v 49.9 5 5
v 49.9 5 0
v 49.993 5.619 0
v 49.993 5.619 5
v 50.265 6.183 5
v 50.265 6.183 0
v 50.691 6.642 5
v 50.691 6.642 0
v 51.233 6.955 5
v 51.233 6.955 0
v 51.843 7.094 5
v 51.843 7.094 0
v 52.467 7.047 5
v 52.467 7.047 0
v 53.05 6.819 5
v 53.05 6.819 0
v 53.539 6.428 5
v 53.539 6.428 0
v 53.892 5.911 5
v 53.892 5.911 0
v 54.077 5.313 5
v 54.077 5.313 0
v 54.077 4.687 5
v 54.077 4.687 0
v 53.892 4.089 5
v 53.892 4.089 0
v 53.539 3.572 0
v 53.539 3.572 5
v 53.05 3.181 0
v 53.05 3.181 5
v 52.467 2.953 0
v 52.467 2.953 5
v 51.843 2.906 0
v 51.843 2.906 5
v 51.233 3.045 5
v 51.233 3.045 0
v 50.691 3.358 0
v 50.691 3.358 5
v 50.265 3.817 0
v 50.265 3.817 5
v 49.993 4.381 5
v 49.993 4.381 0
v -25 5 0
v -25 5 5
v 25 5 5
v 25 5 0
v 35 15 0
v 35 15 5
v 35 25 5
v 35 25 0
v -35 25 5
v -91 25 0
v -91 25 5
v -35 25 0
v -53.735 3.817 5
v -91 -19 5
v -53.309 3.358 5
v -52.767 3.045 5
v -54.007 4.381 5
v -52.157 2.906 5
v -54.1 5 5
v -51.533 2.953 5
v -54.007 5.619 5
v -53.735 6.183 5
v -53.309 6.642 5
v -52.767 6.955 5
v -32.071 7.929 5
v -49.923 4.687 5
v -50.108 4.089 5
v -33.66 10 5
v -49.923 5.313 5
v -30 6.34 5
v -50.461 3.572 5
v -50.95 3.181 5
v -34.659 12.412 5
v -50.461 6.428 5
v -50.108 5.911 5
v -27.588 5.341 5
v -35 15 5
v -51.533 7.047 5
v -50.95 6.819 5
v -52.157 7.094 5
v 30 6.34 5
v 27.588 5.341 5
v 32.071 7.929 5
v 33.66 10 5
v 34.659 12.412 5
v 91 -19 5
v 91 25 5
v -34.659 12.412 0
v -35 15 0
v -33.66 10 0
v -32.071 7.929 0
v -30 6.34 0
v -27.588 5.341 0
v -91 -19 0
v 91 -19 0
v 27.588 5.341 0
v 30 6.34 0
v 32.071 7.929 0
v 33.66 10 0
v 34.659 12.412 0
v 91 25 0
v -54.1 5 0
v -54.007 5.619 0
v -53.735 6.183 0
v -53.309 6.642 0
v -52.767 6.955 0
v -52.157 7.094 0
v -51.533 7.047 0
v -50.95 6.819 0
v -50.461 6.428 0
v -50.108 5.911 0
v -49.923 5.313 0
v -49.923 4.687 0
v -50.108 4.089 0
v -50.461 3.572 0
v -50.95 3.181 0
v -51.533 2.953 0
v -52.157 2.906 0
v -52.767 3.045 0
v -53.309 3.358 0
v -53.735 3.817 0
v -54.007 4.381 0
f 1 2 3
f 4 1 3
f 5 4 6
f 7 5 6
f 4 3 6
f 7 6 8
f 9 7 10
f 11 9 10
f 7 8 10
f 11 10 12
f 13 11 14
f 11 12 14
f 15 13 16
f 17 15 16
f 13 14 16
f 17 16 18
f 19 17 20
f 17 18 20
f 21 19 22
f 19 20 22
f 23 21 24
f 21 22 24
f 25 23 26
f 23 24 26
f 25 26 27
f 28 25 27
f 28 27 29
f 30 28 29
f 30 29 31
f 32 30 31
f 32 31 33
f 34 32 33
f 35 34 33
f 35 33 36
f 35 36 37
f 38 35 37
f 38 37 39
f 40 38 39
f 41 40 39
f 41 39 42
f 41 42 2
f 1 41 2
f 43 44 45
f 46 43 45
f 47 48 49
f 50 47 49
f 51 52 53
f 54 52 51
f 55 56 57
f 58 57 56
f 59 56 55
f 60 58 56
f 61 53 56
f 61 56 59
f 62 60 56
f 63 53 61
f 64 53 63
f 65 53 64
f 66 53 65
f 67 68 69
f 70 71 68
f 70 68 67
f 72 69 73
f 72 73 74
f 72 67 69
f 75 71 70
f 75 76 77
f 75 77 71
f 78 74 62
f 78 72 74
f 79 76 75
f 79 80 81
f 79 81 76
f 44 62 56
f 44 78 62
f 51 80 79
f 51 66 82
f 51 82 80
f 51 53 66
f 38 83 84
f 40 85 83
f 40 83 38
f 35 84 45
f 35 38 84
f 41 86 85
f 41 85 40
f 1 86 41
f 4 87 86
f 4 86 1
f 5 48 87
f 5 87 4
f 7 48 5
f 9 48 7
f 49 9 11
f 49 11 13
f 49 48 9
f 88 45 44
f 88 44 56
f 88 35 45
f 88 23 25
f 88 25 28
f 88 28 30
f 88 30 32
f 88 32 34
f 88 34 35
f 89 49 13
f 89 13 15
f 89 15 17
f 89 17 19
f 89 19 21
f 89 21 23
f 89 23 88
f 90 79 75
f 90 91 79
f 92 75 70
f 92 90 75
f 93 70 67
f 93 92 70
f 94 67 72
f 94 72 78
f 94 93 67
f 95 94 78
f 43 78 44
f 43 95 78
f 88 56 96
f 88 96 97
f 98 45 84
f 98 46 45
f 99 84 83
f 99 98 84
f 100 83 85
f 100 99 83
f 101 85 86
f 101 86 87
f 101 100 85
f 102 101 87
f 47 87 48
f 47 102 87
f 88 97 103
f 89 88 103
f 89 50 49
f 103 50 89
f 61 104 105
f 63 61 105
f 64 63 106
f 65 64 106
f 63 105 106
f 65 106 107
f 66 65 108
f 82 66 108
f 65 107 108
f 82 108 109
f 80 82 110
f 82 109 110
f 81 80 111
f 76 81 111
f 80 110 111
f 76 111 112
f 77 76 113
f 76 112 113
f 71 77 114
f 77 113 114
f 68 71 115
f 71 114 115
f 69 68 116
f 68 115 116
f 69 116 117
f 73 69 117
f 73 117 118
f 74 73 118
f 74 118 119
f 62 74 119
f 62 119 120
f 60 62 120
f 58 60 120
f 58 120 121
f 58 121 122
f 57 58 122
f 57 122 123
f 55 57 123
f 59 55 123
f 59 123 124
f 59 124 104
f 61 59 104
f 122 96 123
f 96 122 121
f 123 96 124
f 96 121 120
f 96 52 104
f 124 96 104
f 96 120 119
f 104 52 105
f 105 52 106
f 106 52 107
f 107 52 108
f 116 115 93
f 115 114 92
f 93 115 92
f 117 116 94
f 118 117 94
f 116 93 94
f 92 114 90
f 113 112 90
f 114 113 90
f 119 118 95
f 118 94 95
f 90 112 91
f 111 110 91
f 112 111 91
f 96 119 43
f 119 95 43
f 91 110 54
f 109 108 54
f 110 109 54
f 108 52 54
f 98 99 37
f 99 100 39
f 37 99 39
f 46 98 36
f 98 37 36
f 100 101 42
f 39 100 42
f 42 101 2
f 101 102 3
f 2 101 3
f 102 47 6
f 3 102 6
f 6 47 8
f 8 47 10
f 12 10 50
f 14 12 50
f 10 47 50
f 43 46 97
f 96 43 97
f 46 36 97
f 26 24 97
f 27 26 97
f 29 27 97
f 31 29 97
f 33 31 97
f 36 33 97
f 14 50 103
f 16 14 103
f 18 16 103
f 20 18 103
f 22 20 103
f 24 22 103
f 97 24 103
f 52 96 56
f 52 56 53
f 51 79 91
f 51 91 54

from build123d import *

# Parameters (mm, degrees)
SKIZZE1_W                       = 182
SKIZZE1_H                       = 50
AUFSATZ_LINEAR_AUSTRAGEN1_DEPTH = 5
M5_GEWINDEBOHRUNG1_D            = 4.2
M5_GEWINDEBOHRUNG1_DEPTH        = 14
M5_GEWINDEBOHRUNG1_TIP          = 1.2618073
SKIZZE4_W                       = 70
SKIZZE4_H                       = 20
SKIZZE4_W_2                     = 182
SKIZZE4_H_2                     = 6
SCHNITT_LINEAR_AUSTRAGEN1_DEPTH = 10
VERRUNDUNG2_R                   = 10


with BuildPart() as part:
    # Skizze1 → Aufsatz-Linear austragen1 (new body)
    with BuildSketch(Plane.XY):
        Rectangle(SKIZZE1_W, SKIZZE1_H)
    extrude(amount=AUFSATZ_LINEAR_AUSTRAGEN1_DEPTH)

    # M5 Gewindebohrung1
    with Locations(Plane.XY.offset(5)):
        with Locations((52, 5), (-52, 5)):
            Hole(M5_GEWINDEBOHRUNG1_D / 2, depth=M5_GEWINDEBOHRUNG1_DEPTH)
            with Locations((0, 0, -(M5_GEWINDEBOHRUNG1_DEPTH + M5_GEWINDEBOHRUNG1_TIP / 2))):  # 118° drill point
                Cone(0, M5_GEWINDEBOHRUNG1_D / 2, M5_GEWINDEBOHRUNG1_TIP, mode=Mode.SUBTRACT)

    # Skizze4 → Schnitt-Linear austragen1 (cut)
    with BuildSketch(Plane.XY.offset(5)):
        with Locations((0, 15)):
            Rectangle(SKIZZE4_W, SKIZZE4_H)
        with Locations((0, -22)):
            Rectangle(SKIZZE4_W_2, SKIZZE4_H_2)
    extrude(amount=-SCHNITT_LINEAR_AUSTRAGEN1_DEPTH, mode=Mode.SUBTRACT)

    # Verrundung2
    verrundung2_edges = [part.edges().sort_by_distance(p)[0] for p in [
        (-35, 5, 2.5),
        (35, 5, 2.5),
    ]]
    fillet(verrundung2_edges, radius=VERRUNDUNG2_R)


solid = part.part
